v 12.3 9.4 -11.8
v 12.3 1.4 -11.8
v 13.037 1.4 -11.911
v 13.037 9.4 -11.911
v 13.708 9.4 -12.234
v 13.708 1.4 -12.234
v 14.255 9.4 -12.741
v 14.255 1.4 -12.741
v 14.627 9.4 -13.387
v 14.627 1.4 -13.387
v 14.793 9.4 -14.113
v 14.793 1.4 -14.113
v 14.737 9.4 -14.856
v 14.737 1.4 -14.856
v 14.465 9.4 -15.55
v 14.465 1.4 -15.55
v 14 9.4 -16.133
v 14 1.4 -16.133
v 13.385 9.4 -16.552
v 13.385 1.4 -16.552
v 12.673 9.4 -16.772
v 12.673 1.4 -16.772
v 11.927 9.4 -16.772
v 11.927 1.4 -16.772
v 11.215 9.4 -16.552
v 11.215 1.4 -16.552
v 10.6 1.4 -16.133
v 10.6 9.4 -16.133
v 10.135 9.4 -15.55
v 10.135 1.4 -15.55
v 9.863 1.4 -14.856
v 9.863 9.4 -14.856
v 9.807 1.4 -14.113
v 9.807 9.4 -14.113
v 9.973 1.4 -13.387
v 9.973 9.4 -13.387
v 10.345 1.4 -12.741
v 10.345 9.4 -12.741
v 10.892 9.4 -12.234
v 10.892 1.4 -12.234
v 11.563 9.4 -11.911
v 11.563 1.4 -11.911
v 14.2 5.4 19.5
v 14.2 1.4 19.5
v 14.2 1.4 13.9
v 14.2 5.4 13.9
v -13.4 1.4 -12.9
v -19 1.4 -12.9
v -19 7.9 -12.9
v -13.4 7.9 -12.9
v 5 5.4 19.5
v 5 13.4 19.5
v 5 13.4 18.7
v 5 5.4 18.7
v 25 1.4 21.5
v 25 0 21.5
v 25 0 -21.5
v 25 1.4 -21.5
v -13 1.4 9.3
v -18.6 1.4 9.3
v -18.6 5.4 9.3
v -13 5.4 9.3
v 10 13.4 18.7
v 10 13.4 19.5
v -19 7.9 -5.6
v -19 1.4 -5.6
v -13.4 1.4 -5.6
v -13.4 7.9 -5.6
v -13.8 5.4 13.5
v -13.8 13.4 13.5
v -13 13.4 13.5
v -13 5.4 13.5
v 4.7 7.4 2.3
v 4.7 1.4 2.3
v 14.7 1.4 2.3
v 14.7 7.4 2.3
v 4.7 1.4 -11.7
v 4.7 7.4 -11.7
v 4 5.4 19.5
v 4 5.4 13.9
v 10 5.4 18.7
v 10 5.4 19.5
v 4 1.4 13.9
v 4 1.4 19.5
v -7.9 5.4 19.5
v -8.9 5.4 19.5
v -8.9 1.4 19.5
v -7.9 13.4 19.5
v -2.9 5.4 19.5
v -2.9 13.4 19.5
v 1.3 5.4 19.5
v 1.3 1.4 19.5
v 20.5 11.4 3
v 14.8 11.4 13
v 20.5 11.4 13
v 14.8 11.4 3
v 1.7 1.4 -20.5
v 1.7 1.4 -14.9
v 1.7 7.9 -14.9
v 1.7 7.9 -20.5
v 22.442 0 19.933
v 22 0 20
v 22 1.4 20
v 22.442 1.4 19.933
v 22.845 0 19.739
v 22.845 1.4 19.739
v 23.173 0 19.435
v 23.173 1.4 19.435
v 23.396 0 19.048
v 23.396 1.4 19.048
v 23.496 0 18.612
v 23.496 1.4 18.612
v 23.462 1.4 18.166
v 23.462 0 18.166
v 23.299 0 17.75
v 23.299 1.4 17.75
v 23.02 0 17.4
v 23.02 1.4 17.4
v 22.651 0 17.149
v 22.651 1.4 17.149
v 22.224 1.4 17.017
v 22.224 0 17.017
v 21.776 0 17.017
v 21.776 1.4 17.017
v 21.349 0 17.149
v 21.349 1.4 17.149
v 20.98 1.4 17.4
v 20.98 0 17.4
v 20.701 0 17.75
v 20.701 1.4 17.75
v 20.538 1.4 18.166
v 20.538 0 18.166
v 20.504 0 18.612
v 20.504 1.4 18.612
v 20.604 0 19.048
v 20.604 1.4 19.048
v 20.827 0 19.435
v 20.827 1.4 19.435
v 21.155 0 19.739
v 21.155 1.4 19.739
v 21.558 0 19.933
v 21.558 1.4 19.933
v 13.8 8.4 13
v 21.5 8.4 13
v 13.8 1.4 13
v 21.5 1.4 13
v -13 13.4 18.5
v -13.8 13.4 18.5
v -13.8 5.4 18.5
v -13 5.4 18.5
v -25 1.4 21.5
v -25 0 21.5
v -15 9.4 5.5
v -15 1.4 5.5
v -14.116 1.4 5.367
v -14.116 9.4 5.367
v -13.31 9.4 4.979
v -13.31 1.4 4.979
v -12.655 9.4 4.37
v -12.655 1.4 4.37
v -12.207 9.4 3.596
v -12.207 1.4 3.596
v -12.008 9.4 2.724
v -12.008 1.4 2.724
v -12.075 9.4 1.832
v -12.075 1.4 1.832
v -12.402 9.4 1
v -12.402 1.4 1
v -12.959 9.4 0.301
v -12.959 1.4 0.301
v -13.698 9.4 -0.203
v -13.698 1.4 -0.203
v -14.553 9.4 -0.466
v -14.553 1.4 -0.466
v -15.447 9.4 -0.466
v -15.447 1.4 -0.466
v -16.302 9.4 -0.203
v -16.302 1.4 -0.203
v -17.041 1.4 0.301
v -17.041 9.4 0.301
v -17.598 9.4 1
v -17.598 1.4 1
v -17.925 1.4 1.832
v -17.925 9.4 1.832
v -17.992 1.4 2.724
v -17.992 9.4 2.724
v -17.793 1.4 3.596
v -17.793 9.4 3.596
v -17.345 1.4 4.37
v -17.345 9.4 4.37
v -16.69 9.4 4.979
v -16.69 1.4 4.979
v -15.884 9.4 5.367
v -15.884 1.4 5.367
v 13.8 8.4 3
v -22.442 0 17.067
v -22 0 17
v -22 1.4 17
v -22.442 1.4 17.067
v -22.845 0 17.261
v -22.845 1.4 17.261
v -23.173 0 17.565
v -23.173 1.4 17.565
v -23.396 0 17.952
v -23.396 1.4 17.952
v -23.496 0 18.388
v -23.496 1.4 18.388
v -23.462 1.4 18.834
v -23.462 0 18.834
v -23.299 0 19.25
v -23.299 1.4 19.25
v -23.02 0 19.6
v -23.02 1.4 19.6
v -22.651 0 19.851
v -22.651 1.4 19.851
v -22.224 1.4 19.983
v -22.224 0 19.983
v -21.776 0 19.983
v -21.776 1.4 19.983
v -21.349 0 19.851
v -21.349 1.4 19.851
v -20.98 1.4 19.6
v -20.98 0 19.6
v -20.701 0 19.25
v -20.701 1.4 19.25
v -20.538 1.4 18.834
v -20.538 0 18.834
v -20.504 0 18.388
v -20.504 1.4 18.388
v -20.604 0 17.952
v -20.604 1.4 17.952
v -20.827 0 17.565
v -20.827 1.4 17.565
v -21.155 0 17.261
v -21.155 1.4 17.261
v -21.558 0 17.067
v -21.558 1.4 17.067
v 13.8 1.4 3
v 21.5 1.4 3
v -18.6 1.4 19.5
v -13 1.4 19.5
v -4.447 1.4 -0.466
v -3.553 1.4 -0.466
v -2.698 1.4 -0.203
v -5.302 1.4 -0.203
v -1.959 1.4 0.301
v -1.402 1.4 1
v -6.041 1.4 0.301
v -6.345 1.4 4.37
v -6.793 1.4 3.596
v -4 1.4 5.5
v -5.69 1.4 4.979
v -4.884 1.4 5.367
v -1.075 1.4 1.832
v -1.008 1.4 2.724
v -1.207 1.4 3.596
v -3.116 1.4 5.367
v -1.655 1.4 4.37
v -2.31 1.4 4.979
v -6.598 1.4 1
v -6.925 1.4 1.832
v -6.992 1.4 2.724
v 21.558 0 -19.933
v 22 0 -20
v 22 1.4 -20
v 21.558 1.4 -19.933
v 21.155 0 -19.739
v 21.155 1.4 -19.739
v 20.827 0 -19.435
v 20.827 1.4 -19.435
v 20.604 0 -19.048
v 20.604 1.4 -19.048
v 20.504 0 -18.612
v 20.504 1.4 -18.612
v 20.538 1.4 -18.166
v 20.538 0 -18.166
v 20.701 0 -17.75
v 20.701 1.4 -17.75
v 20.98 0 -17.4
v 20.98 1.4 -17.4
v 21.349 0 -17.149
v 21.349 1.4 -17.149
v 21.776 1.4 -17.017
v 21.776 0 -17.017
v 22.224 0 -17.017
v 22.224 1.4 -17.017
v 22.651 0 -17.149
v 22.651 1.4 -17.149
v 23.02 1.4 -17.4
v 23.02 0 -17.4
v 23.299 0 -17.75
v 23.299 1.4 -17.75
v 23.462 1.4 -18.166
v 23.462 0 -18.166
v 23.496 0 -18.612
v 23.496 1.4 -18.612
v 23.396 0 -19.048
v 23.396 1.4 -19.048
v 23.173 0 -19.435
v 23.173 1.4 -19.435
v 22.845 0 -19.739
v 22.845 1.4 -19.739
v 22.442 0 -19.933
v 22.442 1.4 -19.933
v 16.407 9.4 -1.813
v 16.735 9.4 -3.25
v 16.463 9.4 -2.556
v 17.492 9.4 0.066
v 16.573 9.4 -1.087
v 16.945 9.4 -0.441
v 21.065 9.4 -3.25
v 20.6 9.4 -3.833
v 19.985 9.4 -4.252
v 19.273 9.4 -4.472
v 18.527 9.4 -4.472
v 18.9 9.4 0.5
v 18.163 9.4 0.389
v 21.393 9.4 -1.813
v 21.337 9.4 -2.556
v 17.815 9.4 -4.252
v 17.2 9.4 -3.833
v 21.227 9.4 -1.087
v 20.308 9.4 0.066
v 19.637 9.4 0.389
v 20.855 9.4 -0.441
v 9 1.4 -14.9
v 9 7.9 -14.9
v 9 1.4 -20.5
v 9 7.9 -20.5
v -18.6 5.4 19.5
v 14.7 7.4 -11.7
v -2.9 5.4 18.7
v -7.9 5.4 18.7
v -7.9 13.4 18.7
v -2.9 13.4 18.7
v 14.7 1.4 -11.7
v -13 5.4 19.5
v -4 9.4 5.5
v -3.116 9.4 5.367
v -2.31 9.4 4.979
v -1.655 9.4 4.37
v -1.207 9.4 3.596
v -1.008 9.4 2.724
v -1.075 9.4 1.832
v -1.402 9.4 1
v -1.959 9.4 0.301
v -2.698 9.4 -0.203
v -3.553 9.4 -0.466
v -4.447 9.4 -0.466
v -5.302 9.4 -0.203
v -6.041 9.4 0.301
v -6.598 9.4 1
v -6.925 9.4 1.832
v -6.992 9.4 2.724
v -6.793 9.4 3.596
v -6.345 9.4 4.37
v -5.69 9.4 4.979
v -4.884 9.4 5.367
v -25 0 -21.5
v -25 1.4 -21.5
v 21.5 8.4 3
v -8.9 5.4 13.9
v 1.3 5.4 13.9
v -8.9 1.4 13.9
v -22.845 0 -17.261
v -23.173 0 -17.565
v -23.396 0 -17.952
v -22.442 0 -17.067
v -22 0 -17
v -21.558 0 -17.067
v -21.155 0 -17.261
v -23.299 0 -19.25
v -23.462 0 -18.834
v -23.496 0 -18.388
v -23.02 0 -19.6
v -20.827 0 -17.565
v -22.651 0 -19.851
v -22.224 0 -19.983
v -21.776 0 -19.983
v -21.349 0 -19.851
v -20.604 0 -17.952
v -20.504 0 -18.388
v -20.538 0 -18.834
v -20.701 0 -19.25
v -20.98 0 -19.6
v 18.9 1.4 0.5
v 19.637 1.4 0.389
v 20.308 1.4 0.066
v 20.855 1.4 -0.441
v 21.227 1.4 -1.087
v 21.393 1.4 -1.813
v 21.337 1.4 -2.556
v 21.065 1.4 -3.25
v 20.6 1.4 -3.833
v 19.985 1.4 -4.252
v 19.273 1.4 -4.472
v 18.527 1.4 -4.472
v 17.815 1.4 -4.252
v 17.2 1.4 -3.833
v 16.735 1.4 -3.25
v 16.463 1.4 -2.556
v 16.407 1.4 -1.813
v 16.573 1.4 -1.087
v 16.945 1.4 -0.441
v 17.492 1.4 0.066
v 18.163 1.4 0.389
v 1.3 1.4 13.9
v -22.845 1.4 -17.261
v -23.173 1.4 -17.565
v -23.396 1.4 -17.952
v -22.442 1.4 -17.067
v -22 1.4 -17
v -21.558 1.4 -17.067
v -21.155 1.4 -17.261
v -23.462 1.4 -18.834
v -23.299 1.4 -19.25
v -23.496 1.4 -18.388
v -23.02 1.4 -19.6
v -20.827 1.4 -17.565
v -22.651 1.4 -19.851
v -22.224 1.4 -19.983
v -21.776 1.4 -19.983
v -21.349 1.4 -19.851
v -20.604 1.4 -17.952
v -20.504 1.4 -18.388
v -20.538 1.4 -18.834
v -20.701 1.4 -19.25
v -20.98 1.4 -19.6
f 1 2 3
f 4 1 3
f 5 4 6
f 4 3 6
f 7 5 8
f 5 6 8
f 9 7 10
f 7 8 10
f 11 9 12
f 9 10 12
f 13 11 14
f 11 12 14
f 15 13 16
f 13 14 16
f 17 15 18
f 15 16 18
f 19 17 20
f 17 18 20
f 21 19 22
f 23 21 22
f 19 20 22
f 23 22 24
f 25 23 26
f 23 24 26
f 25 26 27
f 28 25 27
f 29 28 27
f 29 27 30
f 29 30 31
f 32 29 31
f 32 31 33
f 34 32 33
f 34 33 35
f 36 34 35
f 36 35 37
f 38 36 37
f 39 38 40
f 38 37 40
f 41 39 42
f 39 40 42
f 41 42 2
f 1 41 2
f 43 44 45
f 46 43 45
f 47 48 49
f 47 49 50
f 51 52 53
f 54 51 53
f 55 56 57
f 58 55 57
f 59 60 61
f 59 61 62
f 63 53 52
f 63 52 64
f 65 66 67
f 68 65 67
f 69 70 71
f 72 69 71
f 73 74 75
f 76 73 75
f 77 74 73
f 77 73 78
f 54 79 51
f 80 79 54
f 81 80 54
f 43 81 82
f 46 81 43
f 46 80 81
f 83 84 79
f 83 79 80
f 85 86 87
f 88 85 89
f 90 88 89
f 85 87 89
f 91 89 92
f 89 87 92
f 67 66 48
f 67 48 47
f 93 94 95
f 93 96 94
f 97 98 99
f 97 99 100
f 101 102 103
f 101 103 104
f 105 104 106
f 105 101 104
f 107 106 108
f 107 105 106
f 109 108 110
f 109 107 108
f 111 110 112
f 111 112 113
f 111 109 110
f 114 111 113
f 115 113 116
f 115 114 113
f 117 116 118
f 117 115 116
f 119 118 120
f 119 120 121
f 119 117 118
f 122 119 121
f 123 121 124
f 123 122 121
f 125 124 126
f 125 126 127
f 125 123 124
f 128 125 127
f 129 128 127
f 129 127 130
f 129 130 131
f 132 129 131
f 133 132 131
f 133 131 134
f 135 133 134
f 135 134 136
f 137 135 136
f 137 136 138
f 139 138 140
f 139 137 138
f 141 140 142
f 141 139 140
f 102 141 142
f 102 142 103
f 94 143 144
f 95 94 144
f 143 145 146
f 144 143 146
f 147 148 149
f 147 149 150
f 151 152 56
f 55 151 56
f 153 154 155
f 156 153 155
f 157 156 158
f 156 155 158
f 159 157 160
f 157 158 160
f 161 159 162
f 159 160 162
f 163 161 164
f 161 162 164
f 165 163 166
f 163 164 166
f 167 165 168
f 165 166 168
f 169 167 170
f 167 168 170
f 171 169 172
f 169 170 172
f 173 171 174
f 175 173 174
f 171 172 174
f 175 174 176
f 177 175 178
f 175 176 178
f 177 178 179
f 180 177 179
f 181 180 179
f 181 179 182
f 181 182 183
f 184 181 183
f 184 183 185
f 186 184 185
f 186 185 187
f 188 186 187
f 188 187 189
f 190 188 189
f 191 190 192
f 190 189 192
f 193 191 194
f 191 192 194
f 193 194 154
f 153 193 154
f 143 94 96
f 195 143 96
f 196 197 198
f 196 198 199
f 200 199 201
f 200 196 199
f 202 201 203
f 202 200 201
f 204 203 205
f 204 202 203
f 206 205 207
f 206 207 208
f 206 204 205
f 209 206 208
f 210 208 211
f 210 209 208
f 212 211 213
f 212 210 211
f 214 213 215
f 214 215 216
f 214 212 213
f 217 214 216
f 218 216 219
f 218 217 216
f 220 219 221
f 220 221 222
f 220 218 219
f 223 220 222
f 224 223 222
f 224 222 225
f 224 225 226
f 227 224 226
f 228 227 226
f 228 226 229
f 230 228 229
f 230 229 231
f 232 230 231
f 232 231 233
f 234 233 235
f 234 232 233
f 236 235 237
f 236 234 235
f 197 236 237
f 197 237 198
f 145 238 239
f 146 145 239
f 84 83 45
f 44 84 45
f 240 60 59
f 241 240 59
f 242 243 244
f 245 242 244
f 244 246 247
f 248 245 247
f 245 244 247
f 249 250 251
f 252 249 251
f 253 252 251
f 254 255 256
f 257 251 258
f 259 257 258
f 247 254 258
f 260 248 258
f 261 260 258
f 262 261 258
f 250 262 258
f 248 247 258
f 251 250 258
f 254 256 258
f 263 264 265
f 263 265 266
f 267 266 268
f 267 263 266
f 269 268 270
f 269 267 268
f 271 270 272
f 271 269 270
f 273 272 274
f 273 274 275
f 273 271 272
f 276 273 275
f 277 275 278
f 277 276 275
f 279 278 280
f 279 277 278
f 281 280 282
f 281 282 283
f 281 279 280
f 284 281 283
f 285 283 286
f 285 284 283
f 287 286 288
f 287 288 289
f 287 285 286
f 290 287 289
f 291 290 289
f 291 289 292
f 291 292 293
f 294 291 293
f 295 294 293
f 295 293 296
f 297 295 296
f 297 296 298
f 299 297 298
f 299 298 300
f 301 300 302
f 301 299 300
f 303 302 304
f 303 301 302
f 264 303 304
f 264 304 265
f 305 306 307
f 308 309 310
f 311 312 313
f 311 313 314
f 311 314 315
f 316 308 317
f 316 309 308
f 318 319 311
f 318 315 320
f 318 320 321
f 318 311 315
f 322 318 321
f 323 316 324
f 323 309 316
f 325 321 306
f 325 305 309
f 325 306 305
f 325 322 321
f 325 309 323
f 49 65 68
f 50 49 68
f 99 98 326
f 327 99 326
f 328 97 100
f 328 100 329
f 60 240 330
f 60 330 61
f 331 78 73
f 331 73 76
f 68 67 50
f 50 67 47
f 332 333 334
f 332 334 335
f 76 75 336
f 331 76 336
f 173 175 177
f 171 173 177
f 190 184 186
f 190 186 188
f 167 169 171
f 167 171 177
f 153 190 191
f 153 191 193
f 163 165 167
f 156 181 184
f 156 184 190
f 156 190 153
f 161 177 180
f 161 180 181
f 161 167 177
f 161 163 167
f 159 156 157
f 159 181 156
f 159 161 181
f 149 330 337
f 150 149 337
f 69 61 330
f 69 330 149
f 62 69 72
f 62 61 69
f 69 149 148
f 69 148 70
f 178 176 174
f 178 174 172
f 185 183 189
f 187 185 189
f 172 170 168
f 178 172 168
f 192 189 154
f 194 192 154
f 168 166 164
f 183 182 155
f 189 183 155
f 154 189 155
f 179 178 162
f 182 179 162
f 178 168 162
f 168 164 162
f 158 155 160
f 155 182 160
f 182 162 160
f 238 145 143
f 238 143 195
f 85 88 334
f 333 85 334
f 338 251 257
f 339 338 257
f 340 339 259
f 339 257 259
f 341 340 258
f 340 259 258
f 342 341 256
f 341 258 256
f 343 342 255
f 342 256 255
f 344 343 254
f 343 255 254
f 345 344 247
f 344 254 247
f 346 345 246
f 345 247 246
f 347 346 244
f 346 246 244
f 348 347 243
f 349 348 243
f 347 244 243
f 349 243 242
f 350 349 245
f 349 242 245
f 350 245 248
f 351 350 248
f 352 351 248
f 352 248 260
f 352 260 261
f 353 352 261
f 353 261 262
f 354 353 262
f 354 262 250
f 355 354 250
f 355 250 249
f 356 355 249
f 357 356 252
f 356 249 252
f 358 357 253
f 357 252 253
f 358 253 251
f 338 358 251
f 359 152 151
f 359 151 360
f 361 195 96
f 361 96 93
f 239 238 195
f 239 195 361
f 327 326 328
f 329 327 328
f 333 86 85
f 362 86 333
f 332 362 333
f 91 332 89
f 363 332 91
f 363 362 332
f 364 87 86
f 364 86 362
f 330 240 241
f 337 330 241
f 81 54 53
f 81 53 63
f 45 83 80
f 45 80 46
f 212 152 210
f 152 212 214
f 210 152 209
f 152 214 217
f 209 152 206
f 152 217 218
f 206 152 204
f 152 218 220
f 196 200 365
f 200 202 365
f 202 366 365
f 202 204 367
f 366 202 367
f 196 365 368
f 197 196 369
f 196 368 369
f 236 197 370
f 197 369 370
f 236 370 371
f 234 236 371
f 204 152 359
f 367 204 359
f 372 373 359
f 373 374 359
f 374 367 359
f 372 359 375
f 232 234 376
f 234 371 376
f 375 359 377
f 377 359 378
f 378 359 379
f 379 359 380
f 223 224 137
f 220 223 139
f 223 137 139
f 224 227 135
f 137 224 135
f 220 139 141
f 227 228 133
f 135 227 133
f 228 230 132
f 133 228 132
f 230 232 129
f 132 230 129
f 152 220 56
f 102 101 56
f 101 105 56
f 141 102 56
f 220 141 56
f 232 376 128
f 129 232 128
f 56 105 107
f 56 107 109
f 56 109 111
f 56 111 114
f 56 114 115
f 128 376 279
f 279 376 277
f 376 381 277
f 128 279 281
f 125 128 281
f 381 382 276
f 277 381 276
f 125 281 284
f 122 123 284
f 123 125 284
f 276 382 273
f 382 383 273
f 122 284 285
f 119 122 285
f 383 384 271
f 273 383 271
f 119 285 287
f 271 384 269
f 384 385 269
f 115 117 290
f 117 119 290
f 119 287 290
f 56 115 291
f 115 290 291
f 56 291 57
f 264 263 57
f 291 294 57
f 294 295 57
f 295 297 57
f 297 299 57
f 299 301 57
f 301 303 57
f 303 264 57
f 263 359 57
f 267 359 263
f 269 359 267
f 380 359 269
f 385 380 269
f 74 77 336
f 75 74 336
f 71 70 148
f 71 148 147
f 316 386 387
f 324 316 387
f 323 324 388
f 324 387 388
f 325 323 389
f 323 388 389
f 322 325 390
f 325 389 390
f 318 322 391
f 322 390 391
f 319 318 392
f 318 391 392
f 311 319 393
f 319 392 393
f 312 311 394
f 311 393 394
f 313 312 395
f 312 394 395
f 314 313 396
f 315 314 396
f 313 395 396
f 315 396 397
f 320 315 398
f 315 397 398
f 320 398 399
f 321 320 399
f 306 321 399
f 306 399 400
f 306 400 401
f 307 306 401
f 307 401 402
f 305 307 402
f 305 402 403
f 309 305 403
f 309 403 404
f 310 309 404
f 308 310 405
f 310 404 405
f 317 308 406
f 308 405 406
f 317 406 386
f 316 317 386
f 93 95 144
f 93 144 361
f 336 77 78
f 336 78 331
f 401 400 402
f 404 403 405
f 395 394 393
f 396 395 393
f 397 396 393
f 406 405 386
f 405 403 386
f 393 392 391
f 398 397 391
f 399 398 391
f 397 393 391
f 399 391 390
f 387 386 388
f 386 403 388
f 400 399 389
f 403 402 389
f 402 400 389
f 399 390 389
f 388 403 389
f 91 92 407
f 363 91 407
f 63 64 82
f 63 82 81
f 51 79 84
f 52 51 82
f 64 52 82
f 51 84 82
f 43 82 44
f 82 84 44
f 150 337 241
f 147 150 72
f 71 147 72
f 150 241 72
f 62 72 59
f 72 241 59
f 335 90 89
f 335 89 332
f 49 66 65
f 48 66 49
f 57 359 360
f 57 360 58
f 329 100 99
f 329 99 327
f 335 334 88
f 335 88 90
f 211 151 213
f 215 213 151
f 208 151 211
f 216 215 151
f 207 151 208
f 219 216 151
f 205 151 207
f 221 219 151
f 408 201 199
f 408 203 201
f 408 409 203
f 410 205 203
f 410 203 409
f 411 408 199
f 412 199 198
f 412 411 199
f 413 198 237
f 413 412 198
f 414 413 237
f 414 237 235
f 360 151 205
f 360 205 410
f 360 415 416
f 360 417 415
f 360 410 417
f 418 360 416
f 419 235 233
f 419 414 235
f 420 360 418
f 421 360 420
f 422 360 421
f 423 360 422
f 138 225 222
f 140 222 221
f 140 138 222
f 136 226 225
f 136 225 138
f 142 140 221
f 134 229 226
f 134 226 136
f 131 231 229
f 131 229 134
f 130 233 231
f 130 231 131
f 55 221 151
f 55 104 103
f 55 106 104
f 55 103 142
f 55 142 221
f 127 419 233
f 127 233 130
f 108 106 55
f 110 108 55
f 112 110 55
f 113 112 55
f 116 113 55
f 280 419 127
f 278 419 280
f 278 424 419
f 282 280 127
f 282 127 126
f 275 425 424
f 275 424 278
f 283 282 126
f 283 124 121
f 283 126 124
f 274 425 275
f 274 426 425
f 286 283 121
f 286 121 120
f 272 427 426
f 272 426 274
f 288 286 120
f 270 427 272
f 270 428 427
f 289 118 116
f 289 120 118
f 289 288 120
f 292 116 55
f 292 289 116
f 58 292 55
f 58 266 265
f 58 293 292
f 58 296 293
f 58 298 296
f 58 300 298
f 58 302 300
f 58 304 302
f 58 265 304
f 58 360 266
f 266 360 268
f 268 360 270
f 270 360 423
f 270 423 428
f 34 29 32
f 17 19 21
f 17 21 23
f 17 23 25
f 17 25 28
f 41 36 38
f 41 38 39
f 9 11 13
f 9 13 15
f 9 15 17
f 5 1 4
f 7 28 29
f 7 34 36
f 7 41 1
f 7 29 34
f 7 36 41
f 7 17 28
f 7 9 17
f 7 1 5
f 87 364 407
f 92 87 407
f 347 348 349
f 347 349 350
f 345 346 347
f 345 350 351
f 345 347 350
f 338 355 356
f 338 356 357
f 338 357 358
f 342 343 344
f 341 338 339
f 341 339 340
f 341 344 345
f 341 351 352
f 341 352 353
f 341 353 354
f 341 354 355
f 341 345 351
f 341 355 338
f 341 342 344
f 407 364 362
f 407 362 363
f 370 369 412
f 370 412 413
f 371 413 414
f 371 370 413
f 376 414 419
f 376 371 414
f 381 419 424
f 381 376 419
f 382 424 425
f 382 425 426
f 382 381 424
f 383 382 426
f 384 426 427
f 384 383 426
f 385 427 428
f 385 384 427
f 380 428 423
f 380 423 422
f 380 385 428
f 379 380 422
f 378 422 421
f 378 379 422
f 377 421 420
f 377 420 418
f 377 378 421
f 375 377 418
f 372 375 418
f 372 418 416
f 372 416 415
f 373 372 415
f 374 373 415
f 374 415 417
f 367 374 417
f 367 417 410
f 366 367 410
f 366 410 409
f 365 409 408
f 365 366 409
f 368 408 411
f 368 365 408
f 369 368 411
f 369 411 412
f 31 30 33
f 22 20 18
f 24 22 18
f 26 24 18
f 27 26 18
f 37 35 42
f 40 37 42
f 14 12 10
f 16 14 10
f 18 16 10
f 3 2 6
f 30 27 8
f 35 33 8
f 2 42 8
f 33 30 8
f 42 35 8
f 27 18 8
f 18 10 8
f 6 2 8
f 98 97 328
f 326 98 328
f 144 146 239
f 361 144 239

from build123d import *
from OCP.BRepFilletAPI import BRepFilletAPI_MakeChamfer

# Parameters (mm, degrees)
ESQUISSE1_W          = 50
ESQUISSE1_H          = 43
ESQUISSE1_R          = 1.5
BOSS_EXTRU_1_DEPTH   = 1.4
ESQUISSE3_W          = 5.6
ESQUISSE3_H          = 10.2
BOSS_EXTRU_2_DEPTH   = 4
ESQUISSE3_W_2        = 10.2
ESQUISSE3_H_2        = 5.6
BOSS_EXTRU_2_2_DEPTH = 4
BOSS_EXTRU_2_3_DEPTH = 4
ESQUISSE4_W          = 5.6
ESQUISSE4_H          = 7.3
BOSS_EXTRU_3_DEPTH   = 6.5
ESQUISSE4_W_2        = 7.3
ESQUISSE4_H_2        = 5.6
BOSS_EXTRU_3_2_DEPTH = 6.5
ESQUISSE5_W          = 10
ESQUISSE5_H          = 14
BOSS_EXTRU_4_DEPTH   = 6
ESQUISSE6_W          = 7.7
ESQUISSE6_H          = 10
BOSS_EXTRU_5_DEPTH   = 10
ESQUISSE7_R          = 2.5
BOSS_EXTRU_6_DEPTH   = 8
BOSS_EXTRU_6_2_DEPTH = 8
ESQUISSE8_R          = 3
BOSS_EXTRU_7_DEPTH   = 8
BOSS_EXTRU_7_2_DEPTH = 8
ESQUISSE9_W          = 0.8
ESQUISSE9_H          = 5
ESQUISSE9_W_2        = 5
ESQUISSE9_H_2        = 0.8
BOSS_EXTRU_8_DEPTH   = 8
CHANFREIN1_SIZE      = 3
CHANFREIN1_SIZE2     = 1


with BuildPart() as part:
    # Esquisse1 → Boss.-Extru.1 (new body)
    with BuildSketch(Plane(origin=(0, 0, 0), x_dir=(1, 0, 0), z_dir=(0, 1, 0))):
        Rectangle(ESQUISSE1_W, ESQUISSE1_H)
        with Locations(Location((-22, 18.5, 0), (0, 0, 270))):
            Circle(ESQUISSE1_R, mode=Mode.SUBTRACT)
        with Locations(Location((22, 18.5, 0), (0, 0, 90))):
            Circle(ESQUISSE1_R, mode=Mode.SUBTRACT)
        with Locations(Location((22, -18.5, 0), (0, 0, 270))):
            Circle(ESQUISSE1_R, mode=Mode.SUBTRACT)
        with Locations(Location((-22, -18.5, 0), (0, 0, 90))):
            Circle(ESQUISSE1_R, mode=Mode.SUBTRACT)
    extrude(amount=BOSS_EXTRU_1_DEPTH)


with BuildPart() as body_2:
    # Esquisse3 → Boss.-Extru.2 (new body)
    with BuildSketch(Plane(origin=(0, 1.4, 0), x_dir=(1, 0, 0), z_dir=(0, 1, 0))):
        with Locations((-15.8, -14.4)):
            Rectangle(ESQUISSE3_W, ESQUISSE3_H)
    extrude(amount=BOSS_EXTRU_2_DEPTH)



with BuildPart() as body_3:
    # Esquisse3 → Boss.-Extru.2 2 (new body)
    with BuildSketch(Plane(origin=(0, 1.4, 0), x_dir=(1, 0, 0), z_dir=(0, 1, 0))):
        with Locations((-3.8, -16.7)):
            Rectangle(ESQUISSE3_W_2, ESQUISSE3_H_2)
    extrude(amount=BOSS_EXTRU_2_2_DEPTH)


with BuildPart() as body_4:
    # Esquisse3 → Boss.-Extru.2 3 (new body)
    with BuildSketch(Plane(origin=(0, 1.4, 0), x_dir=(1, 0, 0), z_dir=(0, 1, 0))):
        with Locations((9.1, -16.7)):
            Rectangle(ESQUISSE3_W_2, ESQUISSE3_H_2)
    extrude(amount=BOSS_EXTRU_2_3_DEPTH)


with BuildPart() as body_5:
    # Esquisse4 → Boss.-Extru.3 (new body)
    with BuildSketch(Plane(origin=(0, 1.4, 0), x_dir=(1, 0, 0), z_dir=(0, 1, 0))):
        with Locations((-16.2, 9.25)):
            Rectangle(ESQUISSE4_W, ESQUISSE4_H)
    extrude(amount=BOSS_EXTRU_3_DEPTH)


with BuildPart() as body_6:
    # Esquisse4 → Boss.-Extru.3 2 (new body)
    with BuildSketch(Plane(origin=(0, 1.4, 0), x_dir=(1, 0, 0), z_dir=(0, 1, 0))):
        with Locations((5.35, 17.7)):
            Rectangle(ESQUISSE4_W_2, ESQUISSE4_H_2)
    extrude(amount=BOSS_EXTRU_3_2_DEPTH)


with BuildPart() as body_7:
    # Esquisse5 → Boss.-Extru.4 (new body)
    with BuildSketch(Plane(origin=(0, 1.4, 0), x_dir=(1, 0, 0), z_dir=(0, 1, 0))):
        with Locations((9.7, 4.7)):
            Rectangle(ESQUISSE5_W, ESQUISSE5_H)
    extrude(amount=BOSS_EXTRU_4_DEPTH)


with BuildPart() as body_8:
    # Esquisse6 → Boss.-Extru.5 (new body)
    with BuildSketch(Plane(origin=(0, 1.4, 0), x_dir=(1, 0, 0), z_dir=(0, 1, 0))):
        with Locations((17.65, -8)):
            Rectangle(ESQUISSE6_W, ESQUISSE6_H)
    extrude(amount=BOSS_EXTRU_5_DEPTH)

    # Chanfrein1: one chamfer whose edges measure the first distance from different faces: ONE call of the kernel's chamfer builder (chamfer() names one face for all edges)
    chanfrein1_edges_1 = [body_8.edges().sort_by_distance(p)[0] for p in [
        (21.5, 11.4, 8),
    ]]
    chanfrein1_side_1 = [body_8.faces().sort_by_distance(p)[0] for p in [
        (21.5, 6.4, 8),
    ]]
    chanfrein1_edges_2 = [body_8.edges().sort_by_distance(p)[0] for p in [
        (13.8, 11.4, 8),
    ]]
    chanfrein1_side_2 = [body_8.faces().sort_by_distance(p)[0] for p in [
        (13.8, 6.4, 8),
    ]]
    chanfrein1 = BRepFilletAPI_MakeChamfer(body_8.part.solid().wrapped)
    for e in chanfrein1_edges_1:
        chanfrein1.Add(CHANFREIN1_SIZE, CHANFREIN1_SIZE2, e.wrapped, chanfrein1_side_1[0].wrapped)  # the first distance lies on this face
    for e in chanfrein1_edges_2:
        chanfrein1.Add(CHANFREIN1_SIZE, CHANFREIN1_SIZE2, e.wrapped, chanfrein1_side_2[0].wrapped)  # the first distance lies on this face
    add(Compound.cast(chanfrein1.Shape()), mode=Mode.REPLACE)


with BuildPart() as body_9:
    # Esquisse7 → Boss.-Extru.6 (new body)
    with BuildSketch(Plane(origin=(0, 1.4, 0), x_dir=(1, 0, 0), z_dir=(0, 1, 0))):
        with Locations(Location((12.3, 14.3, 0), (0, 0, 270))):
            Circle(ESQUISSE7_R)
    extrude(amount=BOSS_EXTRU_6_DEPTH)


with BuildPart() as body_10:
    # Esquisse7 → Boss.-Extru.6 2 (new body)
    with BuildSketch(Plane(origin=(0, 1.4, 0), x_dir=(1, 0, 0), z_dir=(0, 1, 0))):
        with Locations(Location((18.9, 2, 0), (0, 0, 270))):
            Circle(ESQUISSE7_R)
    extrude(amount=BOSS_EXTRU_6_2_DEPTH)


with BuildPart() as body_11:
    # Esquisse8 → Boss.-Extru.7 (new body)
    with BuildSketch(Plane(origin=(0, 1.4, 0), x_dir=(1, 0, 0), z_dir=(0, 1, 0))):
        with Locations(Location((-15, -2.5, 0), (0, 0, 270))):
            Circle(ESQUISSE8_R)
    extrude(amount=BOSS_EXTRU_7_DEPTH)


with BuildPart() as body_12:
    # Esquisse8 → Boss.-Extru.7 2 (new body)
    with BuildSketch(Plane(origin=(0, 1.4, 0), x_dir=(1, 0, 0), z_dir=(0, 1, 0))):
        with Locations(Location((-4, -2.5, 0), (0, 0, 270))):
            Circle(ESQUISSE8_R)
    extrude(amount=BOSS_EXTRU_7_2_DEPTH)


with BuildPart() as body_2_1:
    add(body_2.part)

    add(body_3.part)  # Boss.-Extru.8 merges body 3

    add(body_4.part)  # Boss.-Extru.8 merges body 4
    # Esquisse9 → Boss.-Extru.8 (add)
    with BuildSketch(Plane(origin=(0, 5.4, 0), x_dir=(1, 0, 0), z_dir=(0, 1, 0))):
        with Locations((-13.4, -16)):
            Rectangle(ESQUISSE9_W, ESQUISSE9_H)
        with Locations((-5.4, -19.1)):
            Rectangle(ESQUISSE9_W_2, ESQUISSE9_H_2)
        with Locations((7.5, -19.1)):
            Rectangle(ESQUISSE9_W_2, ESQUISSE9_H_2)
    extrude(amount=BOSS_EXTRU_8_DEPTH)


solid = Compound([part.part, body_5.part, body_6.part, body_7.part, body_8.part, body_9.part, body_10.part, body_11.part, body_12.part, body_2_1.part])
